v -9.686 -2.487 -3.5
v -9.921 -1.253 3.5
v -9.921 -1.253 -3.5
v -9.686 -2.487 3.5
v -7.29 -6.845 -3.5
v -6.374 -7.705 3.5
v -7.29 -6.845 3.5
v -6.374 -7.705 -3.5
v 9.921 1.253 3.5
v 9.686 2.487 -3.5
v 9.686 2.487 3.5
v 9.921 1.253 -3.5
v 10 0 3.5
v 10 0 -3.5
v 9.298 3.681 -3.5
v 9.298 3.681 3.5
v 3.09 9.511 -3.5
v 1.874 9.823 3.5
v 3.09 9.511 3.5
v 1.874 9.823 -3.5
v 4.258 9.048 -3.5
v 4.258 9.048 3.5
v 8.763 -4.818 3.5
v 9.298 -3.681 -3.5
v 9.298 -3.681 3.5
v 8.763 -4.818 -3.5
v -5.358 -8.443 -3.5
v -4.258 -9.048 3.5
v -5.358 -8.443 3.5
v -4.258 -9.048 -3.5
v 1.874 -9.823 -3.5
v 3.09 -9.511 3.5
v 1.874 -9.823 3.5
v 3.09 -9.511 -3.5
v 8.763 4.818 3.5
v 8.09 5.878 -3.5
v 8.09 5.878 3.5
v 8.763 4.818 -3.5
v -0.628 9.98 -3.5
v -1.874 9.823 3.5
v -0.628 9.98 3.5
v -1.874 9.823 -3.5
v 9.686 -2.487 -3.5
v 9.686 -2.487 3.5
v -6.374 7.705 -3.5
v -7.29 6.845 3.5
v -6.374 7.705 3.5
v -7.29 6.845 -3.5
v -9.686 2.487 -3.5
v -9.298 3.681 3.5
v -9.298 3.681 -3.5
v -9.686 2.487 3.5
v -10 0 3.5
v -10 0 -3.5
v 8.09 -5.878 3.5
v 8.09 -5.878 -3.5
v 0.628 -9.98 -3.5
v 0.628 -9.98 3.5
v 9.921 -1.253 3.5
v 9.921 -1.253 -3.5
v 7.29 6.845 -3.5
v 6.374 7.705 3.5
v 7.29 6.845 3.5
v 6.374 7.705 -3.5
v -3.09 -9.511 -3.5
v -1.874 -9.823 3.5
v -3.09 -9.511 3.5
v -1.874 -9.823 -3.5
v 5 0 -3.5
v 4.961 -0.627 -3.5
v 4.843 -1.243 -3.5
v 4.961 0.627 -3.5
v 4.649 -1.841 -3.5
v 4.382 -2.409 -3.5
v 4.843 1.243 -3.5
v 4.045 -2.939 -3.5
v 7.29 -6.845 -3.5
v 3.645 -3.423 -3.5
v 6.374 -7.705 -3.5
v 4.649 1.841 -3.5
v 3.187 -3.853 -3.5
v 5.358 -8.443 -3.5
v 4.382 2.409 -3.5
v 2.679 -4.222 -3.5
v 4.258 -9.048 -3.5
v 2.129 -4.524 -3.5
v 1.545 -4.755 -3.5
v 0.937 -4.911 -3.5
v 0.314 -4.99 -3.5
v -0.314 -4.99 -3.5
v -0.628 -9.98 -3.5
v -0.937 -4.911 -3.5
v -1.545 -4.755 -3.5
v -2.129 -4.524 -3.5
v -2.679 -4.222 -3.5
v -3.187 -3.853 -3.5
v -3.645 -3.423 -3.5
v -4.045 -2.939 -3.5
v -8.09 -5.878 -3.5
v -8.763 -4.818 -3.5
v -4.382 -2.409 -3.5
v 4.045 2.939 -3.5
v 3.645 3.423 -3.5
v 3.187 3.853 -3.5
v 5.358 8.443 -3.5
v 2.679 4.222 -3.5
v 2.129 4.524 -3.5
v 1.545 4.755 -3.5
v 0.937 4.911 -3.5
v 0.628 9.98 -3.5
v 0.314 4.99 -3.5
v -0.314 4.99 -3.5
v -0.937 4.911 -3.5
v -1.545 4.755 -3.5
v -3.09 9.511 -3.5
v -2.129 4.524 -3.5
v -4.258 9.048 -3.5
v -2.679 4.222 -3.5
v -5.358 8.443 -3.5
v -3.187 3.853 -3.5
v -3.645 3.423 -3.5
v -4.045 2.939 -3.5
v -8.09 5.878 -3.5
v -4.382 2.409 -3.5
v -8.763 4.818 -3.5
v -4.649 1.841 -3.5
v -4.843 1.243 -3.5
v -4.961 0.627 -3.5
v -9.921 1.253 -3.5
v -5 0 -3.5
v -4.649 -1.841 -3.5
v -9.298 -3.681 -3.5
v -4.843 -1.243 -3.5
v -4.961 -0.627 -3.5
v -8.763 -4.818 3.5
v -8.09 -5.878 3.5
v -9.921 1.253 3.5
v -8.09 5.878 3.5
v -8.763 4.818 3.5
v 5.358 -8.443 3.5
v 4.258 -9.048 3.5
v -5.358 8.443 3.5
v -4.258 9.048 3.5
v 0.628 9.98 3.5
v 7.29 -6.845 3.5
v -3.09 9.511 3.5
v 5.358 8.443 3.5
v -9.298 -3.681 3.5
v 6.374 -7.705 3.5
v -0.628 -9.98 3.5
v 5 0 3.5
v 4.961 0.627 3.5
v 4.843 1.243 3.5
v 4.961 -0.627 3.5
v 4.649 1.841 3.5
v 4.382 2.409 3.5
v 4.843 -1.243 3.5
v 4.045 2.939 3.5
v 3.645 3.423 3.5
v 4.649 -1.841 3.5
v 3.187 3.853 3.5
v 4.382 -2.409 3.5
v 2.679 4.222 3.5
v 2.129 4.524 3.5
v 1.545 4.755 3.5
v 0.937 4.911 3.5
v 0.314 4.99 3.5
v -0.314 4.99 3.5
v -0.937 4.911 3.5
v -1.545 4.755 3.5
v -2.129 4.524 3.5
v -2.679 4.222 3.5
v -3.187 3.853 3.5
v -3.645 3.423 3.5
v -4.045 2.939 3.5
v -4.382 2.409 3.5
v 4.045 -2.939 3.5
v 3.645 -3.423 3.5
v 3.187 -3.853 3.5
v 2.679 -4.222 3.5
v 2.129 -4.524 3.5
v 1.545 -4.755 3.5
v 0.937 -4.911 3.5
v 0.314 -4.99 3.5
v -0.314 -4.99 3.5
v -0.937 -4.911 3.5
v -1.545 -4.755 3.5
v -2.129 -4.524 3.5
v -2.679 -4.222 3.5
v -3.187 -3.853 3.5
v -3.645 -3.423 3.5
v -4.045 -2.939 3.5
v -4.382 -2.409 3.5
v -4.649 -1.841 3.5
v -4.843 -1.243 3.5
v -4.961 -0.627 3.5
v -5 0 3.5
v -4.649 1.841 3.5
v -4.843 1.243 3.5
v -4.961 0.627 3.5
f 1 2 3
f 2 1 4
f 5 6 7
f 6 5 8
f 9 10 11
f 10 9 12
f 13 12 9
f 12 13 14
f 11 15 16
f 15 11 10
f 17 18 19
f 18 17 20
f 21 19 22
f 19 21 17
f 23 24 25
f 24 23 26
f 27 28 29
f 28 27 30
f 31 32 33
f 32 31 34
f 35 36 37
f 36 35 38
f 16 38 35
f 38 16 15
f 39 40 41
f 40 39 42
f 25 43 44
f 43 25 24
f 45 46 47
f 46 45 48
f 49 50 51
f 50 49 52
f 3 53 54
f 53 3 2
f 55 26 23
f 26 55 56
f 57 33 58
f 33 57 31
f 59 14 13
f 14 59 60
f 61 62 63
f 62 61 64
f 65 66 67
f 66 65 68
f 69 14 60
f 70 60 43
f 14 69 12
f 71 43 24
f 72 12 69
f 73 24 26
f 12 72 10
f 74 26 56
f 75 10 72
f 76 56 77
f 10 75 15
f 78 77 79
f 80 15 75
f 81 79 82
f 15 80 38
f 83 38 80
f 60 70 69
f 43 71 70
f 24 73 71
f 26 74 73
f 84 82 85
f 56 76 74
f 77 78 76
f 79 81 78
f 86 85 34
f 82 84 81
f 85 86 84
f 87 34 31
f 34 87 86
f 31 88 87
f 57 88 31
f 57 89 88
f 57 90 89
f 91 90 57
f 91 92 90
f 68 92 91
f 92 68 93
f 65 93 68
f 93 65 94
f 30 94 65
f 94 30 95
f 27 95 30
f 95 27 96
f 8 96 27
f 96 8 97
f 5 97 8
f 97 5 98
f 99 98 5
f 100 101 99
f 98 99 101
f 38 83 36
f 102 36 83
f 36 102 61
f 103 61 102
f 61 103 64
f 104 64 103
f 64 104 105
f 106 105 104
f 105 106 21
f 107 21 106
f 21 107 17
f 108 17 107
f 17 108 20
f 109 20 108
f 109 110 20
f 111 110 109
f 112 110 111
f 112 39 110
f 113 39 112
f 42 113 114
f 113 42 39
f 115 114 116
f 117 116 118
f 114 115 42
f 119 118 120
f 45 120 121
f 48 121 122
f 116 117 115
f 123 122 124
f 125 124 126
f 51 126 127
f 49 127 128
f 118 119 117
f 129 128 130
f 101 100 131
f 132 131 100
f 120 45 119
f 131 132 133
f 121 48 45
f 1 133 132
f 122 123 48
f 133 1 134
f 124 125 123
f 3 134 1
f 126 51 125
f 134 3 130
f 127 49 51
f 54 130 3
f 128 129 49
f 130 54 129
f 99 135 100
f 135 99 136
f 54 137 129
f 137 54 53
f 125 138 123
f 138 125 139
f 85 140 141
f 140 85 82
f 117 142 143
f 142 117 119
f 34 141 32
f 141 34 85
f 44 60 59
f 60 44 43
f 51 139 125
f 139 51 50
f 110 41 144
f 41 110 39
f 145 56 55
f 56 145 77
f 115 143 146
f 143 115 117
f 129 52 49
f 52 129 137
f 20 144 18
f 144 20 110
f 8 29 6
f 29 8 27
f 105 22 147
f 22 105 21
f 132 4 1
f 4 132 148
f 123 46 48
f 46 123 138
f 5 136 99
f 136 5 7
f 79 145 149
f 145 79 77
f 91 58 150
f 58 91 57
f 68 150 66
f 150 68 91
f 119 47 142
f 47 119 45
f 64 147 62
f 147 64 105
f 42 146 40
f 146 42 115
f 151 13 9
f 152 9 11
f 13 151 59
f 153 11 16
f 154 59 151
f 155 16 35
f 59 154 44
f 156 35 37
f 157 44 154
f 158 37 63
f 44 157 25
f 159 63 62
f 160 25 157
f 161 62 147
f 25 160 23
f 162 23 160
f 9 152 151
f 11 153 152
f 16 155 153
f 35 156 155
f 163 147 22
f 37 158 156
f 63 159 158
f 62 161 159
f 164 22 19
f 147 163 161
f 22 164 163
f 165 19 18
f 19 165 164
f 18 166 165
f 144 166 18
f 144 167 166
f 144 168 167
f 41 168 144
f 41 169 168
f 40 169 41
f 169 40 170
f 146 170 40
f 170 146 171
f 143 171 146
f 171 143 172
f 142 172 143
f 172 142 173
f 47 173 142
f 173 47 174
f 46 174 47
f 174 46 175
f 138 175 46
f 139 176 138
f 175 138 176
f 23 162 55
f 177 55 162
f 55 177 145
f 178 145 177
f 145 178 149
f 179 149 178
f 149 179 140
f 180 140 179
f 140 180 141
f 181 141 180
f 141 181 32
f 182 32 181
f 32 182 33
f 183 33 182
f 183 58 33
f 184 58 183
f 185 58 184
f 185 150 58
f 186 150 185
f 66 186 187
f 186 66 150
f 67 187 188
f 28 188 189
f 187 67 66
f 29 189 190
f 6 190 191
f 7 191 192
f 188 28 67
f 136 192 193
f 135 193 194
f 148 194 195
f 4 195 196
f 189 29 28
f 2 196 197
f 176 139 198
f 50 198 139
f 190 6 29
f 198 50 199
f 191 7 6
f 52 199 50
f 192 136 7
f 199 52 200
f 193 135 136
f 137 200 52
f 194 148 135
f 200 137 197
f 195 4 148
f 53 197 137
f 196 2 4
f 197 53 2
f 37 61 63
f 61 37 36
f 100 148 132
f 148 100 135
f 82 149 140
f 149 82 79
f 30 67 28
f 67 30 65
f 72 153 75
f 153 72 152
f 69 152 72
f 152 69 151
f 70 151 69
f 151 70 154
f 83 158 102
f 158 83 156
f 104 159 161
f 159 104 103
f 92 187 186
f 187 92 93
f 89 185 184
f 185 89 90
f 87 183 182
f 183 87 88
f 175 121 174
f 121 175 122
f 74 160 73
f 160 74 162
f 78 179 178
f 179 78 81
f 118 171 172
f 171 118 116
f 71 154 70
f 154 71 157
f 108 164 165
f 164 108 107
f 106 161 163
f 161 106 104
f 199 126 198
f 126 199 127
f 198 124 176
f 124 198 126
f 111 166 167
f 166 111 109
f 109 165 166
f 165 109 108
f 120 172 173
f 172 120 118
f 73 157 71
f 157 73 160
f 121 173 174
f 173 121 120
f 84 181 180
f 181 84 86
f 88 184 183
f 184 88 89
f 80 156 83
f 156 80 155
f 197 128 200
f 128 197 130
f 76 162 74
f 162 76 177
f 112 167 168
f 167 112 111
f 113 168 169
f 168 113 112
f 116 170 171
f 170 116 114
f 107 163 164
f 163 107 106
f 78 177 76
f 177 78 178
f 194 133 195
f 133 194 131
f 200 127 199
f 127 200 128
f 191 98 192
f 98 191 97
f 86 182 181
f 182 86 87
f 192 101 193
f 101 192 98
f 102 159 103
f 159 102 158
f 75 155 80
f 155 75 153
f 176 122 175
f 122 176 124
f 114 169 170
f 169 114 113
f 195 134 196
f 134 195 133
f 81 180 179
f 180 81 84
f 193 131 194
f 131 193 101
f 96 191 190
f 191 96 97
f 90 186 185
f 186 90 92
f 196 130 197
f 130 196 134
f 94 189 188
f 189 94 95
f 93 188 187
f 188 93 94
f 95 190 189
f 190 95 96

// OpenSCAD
$fn = 50;


difference() {
	union() {
		translate(v = [0, 0, -3.5000000000]) {
			cylinder(h = 7, r = 10.0000000000);
		}
	}
	union() {
		translate(v = [0, 0, -100.0000000000]) {
			cylinder(h = 200, r = 5.0000000000);
		}
	}
}
